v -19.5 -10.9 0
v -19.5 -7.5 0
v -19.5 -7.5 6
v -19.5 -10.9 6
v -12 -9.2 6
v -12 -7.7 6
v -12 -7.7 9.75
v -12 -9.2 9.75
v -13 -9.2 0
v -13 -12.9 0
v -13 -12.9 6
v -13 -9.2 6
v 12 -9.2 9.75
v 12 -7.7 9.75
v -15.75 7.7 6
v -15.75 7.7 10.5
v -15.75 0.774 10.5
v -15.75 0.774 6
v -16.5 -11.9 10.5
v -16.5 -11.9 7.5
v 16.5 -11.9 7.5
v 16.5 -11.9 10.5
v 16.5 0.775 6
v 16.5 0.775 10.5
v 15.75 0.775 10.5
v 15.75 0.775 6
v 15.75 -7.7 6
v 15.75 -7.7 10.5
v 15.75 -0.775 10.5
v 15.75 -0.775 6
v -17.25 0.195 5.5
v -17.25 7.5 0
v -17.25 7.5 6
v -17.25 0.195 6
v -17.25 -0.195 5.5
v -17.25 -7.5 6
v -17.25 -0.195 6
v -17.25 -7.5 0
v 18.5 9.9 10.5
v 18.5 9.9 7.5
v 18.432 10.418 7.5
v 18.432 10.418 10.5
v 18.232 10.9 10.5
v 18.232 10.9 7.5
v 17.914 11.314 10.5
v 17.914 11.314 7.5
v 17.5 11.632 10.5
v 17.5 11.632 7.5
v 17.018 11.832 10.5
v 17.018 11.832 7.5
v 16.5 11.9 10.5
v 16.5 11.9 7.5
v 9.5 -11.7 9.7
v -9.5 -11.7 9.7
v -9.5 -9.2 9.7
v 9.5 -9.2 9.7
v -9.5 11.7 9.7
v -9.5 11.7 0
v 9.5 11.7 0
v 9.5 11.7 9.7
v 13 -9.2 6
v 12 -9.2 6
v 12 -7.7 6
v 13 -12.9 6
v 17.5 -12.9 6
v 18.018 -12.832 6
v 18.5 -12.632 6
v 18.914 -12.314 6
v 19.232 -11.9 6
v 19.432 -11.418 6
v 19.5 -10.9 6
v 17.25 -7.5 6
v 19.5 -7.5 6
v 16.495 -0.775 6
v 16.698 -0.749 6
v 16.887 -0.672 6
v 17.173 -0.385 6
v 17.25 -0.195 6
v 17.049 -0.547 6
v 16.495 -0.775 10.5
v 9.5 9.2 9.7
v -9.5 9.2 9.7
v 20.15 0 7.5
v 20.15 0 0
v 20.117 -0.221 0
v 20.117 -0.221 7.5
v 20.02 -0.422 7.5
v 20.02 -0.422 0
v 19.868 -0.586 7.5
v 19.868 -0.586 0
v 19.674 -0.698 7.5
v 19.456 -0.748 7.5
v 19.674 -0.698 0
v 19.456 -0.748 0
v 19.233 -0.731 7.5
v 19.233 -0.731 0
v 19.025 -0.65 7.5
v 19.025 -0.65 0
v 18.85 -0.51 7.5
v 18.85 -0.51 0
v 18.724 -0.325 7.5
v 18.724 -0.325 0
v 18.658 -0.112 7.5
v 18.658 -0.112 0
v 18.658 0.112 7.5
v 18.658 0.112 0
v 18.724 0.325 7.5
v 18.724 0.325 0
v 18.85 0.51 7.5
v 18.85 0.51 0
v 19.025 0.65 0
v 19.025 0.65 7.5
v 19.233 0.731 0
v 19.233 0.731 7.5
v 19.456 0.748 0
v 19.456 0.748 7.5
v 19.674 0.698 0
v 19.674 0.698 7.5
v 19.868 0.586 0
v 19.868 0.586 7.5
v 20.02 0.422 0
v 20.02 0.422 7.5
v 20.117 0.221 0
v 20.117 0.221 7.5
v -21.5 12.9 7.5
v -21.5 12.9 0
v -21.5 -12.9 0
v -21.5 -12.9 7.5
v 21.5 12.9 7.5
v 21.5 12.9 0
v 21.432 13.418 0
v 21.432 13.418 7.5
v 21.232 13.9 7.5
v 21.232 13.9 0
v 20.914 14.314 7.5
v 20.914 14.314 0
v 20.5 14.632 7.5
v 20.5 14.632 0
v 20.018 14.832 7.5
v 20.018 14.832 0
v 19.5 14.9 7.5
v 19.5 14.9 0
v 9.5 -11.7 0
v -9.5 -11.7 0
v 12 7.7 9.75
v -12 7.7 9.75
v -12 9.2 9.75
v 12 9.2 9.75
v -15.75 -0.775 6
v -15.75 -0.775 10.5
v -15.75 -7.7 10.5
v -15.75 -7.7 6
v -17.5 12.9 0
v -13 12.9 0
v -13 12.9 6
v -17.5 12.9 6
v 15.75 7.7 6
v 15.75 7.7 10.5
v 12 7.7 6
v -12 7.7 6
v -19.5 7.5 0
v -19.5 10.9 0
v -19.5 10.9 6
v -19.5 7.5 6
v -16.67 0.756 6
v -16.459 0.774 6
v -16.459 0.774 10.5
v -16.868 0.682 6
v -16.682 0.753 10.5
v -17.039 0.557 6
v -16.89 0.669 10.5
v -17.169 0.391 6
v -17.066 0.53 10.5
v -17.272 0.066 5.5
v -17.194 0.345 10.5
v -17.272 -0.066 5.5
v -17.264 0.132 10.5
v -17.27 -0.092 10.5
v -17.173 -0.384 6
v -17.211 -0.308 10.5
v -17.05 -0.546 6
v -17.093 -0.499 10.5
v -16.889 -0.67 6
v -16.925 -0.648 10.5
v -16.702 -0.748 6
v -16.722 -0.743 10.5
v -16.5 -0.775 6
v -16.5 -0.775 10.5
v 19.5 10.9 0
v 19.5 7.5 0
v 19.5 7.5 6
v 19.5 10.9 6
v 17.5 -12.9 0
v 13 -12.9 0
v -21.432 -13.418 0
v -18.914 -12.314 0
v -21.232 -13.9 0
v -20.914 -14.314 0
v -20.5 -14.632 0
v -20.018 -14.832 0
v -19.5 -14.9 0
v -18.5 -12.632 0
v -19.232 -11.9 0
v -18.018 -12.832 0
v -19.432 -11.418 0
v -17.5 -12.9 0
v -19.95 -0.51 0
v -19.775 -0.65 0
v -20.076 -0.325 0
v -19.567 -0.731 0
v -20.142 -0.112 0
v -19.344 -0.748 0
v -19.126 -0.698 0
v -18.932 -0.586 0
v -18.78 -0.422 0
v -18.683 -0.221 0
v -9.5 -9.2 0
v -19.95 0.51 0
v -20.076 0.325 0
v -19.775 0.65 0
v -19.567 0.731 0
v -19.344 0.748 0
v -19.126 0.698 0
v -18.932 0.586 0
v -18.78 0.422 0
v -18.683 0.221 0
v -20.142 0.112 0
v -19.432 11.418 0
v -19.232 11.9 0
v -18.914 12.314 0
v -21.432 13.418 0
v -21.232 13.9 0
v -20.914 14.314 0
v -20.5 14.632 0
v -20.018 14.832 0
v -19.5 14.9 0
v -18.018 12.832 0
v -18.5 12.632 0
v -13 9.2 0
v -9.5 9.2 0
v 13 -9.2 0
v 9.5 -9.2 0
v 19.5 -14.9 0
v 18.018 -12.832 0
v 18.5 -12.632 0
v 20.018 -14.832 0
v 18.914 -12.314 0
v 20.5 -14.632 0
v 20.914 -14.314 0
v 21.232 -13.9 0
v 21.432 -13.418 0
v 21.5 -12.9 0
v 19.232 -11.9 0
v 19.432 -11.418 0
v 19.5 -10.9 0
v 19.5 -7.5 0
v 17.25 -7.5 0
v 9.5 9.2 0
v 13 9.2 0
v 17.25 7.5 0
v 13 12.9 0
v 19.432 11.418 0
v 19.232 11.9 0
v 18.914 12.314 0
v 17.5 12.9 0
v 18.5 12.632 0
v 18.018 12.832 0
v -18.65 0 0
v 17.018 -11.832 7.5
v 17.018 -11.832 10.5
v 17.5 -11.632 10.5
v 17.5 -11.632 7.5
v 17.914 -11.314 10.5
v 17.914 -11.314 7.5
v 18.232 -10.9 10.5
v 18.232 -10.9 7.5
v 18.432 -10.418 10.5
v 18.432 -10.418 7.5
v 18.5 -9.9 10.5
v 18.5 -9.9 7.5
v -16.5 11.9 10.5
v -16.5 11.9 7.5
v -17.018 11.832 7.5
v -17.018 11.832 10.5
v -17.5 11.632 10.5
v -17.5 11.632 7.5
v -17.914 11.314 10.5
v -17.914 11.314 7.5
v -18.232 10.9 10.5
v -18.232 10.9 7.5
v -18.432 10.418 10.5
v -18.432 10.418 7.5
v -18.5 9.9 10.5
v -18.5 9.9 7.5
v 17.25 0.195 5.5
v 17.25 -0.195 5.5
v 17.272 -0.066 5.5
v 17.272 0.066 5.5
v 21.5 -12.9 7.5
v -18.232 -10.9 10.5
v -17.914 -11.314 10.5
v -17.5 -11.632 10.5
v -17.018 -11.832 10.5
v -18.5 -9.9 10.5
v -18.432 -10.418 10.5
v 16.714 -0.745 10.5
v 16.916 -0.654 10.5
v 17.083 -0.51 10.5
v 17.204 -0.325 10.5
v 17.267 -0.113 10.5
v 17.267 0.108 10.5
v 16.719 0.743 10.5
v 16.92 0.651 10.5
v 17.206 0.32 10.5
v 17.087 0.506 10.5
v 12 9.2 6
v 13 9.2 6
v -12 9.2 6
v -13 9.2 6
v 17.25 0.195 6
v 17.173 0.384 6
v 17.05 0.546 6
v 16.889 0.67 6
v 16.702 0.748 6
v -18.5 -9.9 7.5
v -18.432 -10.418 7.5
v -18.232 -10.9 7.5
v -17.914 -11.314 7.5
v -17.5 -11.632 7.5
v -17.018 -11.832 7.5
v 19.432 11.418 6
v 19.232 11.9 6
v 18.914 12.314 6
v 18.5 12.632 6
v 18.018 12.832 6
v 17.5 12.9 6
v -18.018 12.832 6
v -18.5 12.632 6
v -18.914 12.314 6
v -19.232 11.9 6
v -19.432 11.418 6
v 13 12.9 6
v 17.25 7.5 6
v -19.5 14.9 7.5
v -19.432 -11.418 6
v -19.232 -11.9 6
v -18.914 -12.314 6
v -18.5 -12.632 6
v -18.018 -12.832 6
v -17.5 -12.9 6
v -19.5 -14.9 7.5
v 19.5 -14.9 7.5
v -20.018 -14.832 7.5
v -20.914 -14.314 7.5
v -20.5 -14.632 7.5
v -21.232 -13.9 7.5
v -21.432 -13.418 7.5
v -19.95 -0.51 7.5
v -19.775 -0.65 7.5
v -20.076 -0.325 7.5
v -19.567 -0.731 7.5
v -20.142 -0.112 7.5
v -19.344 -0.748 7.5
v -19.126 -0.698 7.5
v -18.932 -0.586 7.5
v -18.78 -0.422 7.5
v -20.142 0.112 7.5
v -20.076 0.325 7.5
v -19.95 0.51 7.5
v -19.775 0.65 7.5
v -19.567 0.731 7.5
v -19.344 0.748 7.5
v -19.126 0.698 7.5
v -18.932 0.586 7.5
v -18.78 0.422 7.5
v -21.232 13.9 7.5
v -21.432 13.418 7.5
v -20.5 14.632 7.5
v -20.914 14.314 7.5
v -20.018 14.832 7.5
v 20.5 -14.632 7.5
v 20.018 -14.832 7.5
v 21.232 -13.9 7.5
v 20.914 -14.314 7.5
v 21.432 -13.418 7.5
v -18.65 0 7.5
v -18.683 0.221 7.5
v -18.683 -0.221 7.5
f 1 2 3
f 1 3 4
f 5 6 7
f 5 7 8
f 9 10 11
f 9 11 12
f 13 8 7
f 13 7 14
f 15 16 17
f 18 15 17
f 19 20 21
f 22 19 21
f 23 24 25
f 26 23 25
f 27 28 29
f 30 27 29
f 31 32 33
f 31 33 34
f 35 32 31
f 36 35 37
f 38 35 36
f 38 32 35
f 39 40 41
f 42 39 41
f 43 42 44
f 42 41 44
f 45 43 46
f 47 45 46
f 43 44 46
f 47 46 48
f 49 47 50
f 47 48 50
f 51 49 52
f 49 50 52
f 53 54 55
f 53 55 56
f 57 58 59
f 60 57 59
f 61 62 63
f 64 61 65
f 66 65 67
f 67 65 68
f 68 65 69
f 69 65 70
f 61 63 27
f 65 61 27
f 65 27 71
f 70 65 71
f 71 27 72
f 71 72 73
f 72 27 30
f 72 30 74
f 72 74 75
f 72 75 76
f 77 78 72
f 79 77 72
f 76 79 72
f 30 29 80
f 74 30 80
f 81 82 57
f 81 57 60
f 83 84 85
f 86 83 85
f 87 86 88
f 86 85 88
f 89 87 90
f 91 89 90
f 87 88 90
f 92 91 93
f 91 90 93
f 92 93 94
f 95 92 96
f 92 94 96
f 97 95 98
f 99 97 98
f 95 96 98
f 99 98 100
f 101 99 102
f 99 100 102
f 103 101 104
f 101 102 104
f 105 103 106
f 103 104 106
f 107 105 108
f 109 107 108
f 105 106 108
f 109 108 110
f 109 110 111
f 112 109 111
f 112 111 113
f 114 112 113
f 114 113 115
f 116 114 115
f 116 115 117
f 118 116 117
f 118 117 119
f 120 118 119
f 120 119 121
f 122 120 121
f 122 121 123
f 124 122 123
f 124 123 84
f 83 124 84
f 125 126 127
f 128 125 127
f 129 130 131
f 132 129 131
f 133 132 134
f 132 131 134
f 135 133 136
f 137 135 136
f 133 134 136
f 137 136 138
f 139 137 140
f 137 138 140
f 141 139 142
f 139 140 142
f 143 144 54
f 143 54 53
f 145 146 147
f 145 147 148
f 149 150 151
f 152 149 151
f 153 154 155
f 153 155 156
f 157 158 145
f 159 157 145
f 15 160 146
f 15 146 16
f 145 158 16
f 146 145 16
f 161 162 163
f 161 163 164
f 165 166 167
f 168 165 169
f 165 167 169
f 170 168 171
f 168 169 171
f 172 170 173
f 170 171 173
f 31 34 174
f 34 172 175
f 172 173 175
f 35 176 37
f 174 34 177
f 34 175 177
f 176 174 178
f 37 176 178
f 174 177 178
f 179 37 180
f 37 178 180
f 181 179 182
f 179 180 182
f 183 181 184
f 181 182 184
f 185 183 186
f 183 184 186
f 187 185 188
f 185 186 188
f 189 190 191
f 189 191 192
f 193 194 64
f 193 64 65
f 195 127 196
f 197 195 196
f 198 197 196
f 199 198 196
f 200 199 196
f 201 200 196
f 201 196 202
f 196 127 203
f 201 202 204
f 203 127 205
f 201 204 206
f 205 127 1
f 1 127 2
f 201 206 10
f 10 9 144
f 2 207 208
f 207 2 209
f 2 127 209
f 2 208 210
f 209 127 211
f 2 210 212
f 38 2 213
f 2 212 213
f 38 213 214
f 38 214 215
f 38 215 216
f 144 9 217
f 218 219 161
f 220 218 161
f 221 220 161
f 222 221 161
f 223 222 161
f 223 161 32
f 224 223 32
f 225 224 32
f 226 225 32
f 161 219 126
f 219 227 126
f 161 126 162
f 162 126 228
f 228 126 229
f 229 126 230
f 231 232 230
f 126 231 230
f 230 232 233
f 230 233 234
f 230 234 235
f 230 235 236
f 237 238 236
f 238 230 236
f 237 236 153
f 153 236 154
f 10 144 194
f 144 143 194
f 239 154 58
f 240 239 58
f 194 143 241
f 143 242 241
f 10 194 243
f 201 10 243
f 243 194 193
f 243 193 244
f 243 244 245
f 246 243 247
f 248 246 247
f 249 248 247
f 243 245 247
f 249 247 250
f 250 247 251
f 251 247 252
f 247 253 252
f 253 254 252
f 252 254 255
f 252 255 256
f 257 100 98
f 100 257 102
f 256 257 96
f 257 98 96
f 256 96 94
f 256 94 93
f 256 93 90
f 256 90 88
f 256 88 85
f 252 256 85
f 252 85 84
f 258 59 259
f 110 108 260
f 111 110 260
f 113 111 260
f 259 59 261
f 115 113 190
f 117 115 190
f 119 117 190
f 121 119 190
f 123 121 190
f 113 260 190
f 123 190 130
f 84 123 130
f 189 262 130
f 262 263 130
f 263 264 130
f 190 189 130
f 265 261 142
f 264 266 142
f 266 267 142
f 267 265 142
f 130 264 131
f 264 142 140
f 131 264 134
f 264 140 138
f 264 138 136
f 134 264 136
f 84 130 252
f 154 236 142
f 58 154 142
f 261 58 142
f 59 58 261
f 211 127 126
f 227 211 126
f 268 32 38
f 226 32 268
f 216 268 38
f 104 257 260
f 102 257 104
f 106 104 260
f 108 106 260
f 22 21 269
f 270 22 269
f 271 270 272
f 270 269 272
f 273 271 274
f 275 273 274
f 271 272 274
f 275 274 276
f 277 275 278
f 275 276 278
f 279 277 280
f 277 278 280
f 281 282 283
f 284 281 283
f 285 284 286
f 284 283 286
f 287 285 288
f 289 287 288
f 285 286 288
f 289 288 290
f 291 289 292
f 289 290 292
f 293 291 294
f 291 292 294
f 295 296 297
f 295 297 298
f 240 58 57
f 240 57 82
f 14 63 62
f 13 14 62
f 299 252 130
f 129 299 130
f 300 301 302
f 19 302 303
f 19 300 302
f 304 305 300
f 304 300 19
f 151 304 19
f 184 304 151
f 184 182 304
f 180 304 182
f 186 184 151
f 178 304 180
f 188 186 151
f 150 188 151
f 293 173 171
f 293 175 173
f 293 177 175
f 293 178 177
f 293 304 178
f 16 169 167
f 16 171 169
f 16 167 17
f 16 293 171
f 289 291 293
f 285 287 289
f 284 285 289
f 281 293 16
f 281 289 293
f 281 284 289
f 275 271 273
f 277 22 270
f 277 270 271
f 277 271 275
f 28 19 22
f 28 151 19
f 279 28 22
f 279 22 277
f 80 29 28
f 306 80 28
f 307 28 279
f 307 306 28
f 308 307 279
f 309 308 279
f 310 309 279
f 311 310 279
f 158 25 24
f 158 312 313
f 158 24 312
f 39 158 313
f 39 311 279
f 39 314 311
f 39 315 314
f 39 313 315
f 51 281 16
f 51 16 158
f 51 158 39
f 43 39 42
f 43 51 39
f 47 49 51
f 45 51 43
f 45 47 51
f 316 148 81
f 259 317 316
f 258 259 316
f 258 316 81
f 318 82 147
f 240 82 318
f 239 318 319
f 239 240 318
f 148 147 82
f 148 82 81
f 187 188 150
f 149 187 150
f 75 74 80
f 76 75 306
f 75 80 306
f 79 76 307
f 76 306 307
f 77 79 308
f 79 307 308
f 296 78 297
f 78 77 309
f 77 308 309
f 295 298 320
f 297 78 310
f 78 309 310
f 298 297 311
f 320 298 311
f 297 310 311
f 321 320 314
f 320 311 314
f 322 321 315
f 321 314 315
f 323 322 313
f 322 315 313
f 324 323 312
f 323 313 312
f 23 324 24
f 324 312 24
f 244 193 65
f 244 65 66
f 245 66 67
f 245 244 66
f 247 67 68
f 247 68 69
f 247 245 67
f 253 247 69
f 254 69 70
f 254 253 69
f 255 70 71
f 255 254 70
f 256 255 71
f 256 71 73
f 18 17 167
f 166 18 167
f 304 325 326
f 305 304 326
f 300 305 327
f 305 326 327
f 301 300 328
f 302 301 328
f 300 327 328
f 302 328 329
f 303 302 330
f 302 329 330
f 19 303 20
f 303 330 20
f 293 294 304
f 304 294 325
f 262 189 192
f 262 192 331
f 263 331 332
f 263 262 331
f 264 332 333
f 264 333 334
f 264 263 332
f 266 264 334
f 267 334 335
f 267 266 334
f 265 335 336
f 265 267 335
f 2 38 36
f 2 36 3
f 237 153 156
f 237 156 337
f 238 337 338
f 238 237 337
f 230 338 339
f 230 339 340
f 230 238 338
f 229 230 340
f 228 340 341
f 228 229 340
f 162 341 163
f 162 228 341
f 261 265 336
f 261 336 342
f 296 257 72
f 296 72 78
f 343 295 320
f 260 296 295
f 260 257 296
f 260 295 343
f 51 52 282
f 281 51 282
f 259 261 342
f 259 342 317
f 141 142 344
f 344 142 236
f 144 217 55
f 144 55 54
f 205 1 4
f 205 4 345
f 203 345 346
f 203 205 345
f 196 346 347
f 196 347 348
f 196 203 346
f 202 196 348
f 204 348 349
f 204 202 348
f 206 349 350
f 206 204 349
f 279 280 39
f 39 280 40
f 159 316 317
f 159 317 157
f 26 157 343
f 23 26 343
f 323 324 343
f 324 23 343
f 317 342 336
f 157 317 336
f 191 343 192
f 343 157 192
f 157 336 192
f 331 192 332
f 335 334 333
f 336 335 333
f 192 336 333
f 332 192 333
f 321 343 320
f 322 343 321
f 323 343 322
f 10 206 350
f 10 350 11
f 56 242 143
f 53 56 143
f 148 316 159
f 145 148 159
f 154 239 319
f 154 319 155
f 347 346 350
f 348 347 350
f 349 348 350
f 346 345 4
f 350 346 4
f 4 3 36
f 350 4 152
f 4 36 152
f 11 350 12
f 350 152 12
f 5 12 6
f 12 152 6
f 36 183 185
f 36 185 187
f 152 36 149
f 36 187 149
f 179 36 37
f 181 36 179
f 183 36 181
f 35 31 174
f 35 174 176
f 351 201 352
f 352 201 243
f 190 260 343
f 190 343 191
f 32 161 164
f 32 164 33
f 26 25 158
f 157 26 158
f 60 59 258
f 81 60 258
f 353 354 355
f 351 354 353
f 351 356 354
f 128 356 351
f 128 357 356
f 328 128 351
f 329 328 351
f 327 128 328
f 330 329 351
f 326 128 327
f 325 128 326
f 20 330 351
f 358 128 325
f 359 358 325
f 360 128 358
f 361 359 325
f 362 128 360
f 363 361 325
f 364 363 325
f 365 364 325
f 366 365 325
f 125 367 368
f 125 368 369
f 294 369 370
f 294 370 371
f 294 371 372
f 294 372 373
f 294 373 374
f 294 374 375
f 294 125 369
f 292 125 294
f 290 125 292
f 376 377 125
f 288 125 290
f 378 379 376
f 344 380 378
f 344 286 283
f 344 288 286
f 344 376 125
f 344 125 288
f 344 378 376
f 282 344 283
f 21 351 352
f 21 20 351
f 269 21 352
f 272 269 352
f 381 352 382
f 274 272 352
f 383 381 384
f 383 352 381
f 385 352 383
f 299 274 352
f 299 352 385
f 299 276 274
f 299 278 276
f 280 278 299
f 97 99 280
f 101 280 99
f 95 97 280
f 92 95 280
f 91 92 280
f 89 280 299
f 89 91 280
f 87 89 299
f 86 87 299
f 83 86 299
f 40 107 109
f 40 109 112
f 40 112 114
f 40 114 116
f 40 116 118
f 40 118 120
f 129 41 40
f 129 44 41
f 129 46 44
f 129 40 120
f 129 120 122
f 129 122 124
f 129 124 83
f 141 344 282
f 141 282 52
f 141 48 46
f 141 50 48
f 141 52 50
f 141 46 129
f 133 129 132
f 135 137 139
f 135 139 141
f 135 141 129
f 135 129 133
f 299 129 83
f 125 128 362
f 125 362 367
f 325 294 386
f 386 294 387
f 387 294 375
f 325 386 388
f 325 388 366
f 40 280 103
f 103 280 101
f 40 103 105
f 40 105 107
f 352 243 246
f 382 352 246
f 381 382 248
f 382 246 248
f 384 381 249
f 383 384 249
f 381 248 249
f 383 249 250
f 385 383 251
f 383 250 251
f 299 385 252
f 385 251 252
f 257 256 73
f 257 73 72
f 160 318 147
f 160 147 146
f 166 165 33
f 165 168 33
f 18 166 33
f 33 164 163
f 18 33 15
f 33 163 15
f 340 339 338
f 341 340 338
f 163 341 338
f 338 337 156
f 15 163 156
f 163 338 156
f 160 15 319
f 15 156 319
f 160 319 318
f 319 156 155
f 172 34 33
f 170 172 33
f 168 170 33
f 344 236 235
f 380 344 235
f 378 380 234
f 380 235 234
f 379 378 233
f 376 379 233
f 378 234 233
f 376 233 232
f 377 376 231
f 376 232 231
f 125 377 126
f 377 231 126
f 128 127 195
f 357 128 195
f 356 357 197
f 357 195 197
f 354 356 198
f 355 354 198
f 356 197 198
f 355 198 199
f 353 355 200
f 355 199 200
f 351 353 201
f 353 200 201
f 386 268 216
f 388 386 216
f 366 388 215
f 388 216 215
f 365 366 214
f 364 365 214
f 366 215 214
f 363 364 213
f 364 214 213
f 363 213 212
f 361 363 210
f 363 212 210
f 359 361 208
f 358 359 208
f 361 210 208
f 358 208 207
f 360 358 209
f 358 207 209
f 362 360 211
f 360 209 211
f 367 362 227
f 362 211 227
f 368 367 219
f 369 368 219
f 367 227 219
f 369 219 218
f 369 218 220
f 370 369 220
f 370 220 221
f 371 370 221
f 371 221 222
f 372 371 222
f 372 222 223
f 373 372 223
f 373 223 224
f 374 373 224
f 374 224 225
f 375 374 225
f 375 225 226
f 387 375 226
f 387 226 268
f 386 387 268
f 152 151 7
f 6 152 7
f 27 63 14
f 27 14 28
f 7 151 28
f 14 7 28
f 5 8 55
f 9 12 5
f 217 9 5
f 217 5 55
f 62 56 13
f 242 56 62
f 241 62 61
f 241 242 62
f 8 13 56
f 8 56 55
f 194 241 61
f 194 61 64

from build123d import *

# Parameters (mm, degrees)
F1_DEPTH  = 7.5
F3_DEPTH  = 6
F5_DEPTH  = 3
F7_DEPTH  = 5
F8_W      = 24
F8_H      = 1.5
F9_DEPTH  = 3.75
F10_W     = 19
F10_H     = 2.5
F11_DEPTH = 9.7
F12_R     = 0.75
F13_DEPTH = 7.7
F14_W     = 24
F14_H     = 1.5
F15_DEPTH = 3.75
F16_DEPTH = 9.7


with BuildPart() as f1:
    # F0 (on Top) → F1 (new body)
    with BuildSketch(Plane.XY):
        with BuildLine():
            Line((-19.5, -14.9), (19.5, -14.9))
            ThreePointArc((19.5, -14.9), (20.9142135624, -14.3142135624), (21.5, -12.9))
            Line((21.5, -12.9), (21.5, 12.9))
            ThreePointArc((21.5, 12.9), (20.9142135624, 14.3142135624), (19.5, 14.9))
            Line((19.5, 14.9), (-19.5, 14.9))
            ThreePointArc((-19.5, 14.9), (-20.9142135624, 14.3142135624), (-21.5, 12.9))
            Line((-21.5, 12.9), (-21.5, -12.9))
            ThreePointArc((-21.5, -12.9), (-20.9142135624, -14.3142135624), (-19.5, -14.9))
        make_face()
    extrude(amount=F1_DEPTH)

    # F2 (on Top) → F3 (cut)
    with BuildSketch(Plane.XY):
        with BuildLine():
            Line((-13, -9.2), (13, -9.2))
            Line((13, -9.2), (13, -12.9))
            Line((13, -12.9), (17.5, -12.9))
            ThreePointArc((17.5, -12.9), (18.9142135624, -12.3142135624), (19.5, -10.9))
            Line((19.5, -10.9), (19.5, -7.5))
            Line((19.5, -7.5), (17.25, -7.5))
            Line((17.25, -7.5), (17.25, 7.5))
            Line((17.25, 7.5), (19.5, 7.5))
            Line((19.5, 7.5), (19.5, 10.9))
            ThreePointArc((19.5, 10.9), (18.9142135624, 12.3142135624), (17.5, 12.9))
            Line((17.5, 12.9), (13, 12.9))
            Line((13, 12.9), (13, 9.2))
            Line((13, 9.2), (-13, 9.2))
            Line((-13, 9.2), (-13, 12.9))
            Line((-13, 12.9), (-17.5, 12.9))
            ThreePointArc((-17.5, 12.9), (-18.9142135624, 12.3142135624), (-19.5, 10.9))
            Line((-19.5, 10.9), (-19.5, 7.5))
            Line((-19.5, 7.5), (-17.25, 7.5))
            Line((-17.25, 7.5), (-17.25, -7.5))
            Line((-17.25, -7.5), (-19.5, -7.5))
            Line((-19.5, -7.5), (-19.5, -10.9))
            ThreePointArc((-19.5, -10.9), (-18.9142135624, -12.3142135624), (-17.5, -12.9))
            Line((-17.5, -12.9), (-13, -12.9))
            Line((-13, -12.9), (-13, -9.2))
        make_face()
    extrude(amount=F3_DEPTH, mode=Mode.SUBTRACT)

    # F4 (on face) → F5 (join)
    with BuildSketch(Plane.XY.offset(7.5)):
        with BuildLine():
            Line((-16.5, -11.9), (16.5, -11.9))
            ThreePointArc((16.5, -11.9), (17.9142135624, -11.3142135624), (18.5, -9.9))
            Line((18.5, -9.9), (18.5, 9.9))
            ThreePointArc((18.5, 9.9), (17.9142135624, 11.3142135624), (16.5, 11.9))
            Line((16.5, 11.9), (-16.5, 11.9))
            ThreePointArc((-16.5, 11.9), (-17.9142135624, 11.3142135624), (-18.5, 9.9))
            Line((-18.5, 9.9), (-18.5, -9.9))
            ThreePointArc((-18.5, -9.9), (-17.9142135624, -11.3142135624), (-16.5, -11.9))
        make_face()
    extrude(amount=F5_DEPTH)

    # F6 (on face) → F7 (cut)
    with BuildSketch(Plane.XY.offset(10.5)):
        with BuildLine():
            Line((-15.75, -7.7), (15.75, -7.7))
            Line((15.75, -7.7), (15.75, -0.7749841599))
            Line((15.75, -0.7749841599), (16.4950450141, -0.7749841599))
            ThreePointArc((16.4950450141, -0.7749841599), (17.27499604, -0.0024775056), (16.5, 0.775))
            Line((16.5, 0.775), (15.75, 0.775))
            Line((15.75, 0.775), (15.75, 7.7))
            Line((15.75, 7.7), (-15.75, 7.7))
            Line((-15.75, 7.7), (-15.75, 0.7739160408))
            Line((-15.75, 0.7739160408), (-16.459024863, 0.7739160408))
            ThreePointArc((-16.459024863, 0.7739160408), (-17.2747289628, 0.020494736), (-16.5, -0.775))
            Line((-16.5, -0.775), (-15.75, -0.775))
            Line((-15.75, -0.775), (-15.75, -7.7))
        make_face()
    extrude(amount=-F7_DEPTH, mode=Mode.SUBTRACT)

    # F8 (on face) → F9 (cut)
    with BuildSketch(Plane(origin=(0, 0, 6), x_dir=(1, 0, 0), z_dir=(0, 0, -1))):
        with Locations((0, -8.45)):
            Rectangle(F8_W, F8_H)
    extrude(amount=-F9_DEPTH, mode=Mode.SUBTRACT)

    # F10 (on face) → F11 (cut)
    with BuildSketch(Plane(origin=(0, 0, 0), x_dir=(1, 0, 0), z_dir=(0, 0, -1))):
        with Locations((0, -10.45)):
            Rectangle(F10_W, F10_H)
    extrude(amount=-F11_DEPTH, mode=Mode.SUBTRACT)

    # F12 (on face) → F13 (cut)
    with BuildSketch(Plane(origin=(0, 0, 0), x_dir=(1, 0, 0), z_dir=(0, 0, -1))):
        with Locations((19.4, 0)):
            Circle(F12_R)
        with Locations((-19.4, 0)):
            Circle(F12_R)
    extrude(amount=-F13_DEPTH, mode=Mode.SUBTRACT)

    # F14 (on face) → F15 (cut)
    with BuildSketch(Plane(origin=(0, 0, 6), x_dir=(1, 0, 0), z_dir=(0, 0, -1))):
        with Locations((0, 8.45)):
            Rectangle(F14_W, F14_H)
    extrude(amount=-F15_DEPTH, mode=Mode.SUBTRACT)

    # F10 (on face) → F16 (cut)
    with BuildSketch(Plane(origin=(0, 0, 0), x_dir=(1, 0, 0), z_dir=(0, 0, -1))):
        with Locations((0, 10.45)):
            Rectangle(F10_W, F10_H)
    extrude(amount=-F16_DEPTH, mode=Mode.SUBTRACT)


solid = f1.part
